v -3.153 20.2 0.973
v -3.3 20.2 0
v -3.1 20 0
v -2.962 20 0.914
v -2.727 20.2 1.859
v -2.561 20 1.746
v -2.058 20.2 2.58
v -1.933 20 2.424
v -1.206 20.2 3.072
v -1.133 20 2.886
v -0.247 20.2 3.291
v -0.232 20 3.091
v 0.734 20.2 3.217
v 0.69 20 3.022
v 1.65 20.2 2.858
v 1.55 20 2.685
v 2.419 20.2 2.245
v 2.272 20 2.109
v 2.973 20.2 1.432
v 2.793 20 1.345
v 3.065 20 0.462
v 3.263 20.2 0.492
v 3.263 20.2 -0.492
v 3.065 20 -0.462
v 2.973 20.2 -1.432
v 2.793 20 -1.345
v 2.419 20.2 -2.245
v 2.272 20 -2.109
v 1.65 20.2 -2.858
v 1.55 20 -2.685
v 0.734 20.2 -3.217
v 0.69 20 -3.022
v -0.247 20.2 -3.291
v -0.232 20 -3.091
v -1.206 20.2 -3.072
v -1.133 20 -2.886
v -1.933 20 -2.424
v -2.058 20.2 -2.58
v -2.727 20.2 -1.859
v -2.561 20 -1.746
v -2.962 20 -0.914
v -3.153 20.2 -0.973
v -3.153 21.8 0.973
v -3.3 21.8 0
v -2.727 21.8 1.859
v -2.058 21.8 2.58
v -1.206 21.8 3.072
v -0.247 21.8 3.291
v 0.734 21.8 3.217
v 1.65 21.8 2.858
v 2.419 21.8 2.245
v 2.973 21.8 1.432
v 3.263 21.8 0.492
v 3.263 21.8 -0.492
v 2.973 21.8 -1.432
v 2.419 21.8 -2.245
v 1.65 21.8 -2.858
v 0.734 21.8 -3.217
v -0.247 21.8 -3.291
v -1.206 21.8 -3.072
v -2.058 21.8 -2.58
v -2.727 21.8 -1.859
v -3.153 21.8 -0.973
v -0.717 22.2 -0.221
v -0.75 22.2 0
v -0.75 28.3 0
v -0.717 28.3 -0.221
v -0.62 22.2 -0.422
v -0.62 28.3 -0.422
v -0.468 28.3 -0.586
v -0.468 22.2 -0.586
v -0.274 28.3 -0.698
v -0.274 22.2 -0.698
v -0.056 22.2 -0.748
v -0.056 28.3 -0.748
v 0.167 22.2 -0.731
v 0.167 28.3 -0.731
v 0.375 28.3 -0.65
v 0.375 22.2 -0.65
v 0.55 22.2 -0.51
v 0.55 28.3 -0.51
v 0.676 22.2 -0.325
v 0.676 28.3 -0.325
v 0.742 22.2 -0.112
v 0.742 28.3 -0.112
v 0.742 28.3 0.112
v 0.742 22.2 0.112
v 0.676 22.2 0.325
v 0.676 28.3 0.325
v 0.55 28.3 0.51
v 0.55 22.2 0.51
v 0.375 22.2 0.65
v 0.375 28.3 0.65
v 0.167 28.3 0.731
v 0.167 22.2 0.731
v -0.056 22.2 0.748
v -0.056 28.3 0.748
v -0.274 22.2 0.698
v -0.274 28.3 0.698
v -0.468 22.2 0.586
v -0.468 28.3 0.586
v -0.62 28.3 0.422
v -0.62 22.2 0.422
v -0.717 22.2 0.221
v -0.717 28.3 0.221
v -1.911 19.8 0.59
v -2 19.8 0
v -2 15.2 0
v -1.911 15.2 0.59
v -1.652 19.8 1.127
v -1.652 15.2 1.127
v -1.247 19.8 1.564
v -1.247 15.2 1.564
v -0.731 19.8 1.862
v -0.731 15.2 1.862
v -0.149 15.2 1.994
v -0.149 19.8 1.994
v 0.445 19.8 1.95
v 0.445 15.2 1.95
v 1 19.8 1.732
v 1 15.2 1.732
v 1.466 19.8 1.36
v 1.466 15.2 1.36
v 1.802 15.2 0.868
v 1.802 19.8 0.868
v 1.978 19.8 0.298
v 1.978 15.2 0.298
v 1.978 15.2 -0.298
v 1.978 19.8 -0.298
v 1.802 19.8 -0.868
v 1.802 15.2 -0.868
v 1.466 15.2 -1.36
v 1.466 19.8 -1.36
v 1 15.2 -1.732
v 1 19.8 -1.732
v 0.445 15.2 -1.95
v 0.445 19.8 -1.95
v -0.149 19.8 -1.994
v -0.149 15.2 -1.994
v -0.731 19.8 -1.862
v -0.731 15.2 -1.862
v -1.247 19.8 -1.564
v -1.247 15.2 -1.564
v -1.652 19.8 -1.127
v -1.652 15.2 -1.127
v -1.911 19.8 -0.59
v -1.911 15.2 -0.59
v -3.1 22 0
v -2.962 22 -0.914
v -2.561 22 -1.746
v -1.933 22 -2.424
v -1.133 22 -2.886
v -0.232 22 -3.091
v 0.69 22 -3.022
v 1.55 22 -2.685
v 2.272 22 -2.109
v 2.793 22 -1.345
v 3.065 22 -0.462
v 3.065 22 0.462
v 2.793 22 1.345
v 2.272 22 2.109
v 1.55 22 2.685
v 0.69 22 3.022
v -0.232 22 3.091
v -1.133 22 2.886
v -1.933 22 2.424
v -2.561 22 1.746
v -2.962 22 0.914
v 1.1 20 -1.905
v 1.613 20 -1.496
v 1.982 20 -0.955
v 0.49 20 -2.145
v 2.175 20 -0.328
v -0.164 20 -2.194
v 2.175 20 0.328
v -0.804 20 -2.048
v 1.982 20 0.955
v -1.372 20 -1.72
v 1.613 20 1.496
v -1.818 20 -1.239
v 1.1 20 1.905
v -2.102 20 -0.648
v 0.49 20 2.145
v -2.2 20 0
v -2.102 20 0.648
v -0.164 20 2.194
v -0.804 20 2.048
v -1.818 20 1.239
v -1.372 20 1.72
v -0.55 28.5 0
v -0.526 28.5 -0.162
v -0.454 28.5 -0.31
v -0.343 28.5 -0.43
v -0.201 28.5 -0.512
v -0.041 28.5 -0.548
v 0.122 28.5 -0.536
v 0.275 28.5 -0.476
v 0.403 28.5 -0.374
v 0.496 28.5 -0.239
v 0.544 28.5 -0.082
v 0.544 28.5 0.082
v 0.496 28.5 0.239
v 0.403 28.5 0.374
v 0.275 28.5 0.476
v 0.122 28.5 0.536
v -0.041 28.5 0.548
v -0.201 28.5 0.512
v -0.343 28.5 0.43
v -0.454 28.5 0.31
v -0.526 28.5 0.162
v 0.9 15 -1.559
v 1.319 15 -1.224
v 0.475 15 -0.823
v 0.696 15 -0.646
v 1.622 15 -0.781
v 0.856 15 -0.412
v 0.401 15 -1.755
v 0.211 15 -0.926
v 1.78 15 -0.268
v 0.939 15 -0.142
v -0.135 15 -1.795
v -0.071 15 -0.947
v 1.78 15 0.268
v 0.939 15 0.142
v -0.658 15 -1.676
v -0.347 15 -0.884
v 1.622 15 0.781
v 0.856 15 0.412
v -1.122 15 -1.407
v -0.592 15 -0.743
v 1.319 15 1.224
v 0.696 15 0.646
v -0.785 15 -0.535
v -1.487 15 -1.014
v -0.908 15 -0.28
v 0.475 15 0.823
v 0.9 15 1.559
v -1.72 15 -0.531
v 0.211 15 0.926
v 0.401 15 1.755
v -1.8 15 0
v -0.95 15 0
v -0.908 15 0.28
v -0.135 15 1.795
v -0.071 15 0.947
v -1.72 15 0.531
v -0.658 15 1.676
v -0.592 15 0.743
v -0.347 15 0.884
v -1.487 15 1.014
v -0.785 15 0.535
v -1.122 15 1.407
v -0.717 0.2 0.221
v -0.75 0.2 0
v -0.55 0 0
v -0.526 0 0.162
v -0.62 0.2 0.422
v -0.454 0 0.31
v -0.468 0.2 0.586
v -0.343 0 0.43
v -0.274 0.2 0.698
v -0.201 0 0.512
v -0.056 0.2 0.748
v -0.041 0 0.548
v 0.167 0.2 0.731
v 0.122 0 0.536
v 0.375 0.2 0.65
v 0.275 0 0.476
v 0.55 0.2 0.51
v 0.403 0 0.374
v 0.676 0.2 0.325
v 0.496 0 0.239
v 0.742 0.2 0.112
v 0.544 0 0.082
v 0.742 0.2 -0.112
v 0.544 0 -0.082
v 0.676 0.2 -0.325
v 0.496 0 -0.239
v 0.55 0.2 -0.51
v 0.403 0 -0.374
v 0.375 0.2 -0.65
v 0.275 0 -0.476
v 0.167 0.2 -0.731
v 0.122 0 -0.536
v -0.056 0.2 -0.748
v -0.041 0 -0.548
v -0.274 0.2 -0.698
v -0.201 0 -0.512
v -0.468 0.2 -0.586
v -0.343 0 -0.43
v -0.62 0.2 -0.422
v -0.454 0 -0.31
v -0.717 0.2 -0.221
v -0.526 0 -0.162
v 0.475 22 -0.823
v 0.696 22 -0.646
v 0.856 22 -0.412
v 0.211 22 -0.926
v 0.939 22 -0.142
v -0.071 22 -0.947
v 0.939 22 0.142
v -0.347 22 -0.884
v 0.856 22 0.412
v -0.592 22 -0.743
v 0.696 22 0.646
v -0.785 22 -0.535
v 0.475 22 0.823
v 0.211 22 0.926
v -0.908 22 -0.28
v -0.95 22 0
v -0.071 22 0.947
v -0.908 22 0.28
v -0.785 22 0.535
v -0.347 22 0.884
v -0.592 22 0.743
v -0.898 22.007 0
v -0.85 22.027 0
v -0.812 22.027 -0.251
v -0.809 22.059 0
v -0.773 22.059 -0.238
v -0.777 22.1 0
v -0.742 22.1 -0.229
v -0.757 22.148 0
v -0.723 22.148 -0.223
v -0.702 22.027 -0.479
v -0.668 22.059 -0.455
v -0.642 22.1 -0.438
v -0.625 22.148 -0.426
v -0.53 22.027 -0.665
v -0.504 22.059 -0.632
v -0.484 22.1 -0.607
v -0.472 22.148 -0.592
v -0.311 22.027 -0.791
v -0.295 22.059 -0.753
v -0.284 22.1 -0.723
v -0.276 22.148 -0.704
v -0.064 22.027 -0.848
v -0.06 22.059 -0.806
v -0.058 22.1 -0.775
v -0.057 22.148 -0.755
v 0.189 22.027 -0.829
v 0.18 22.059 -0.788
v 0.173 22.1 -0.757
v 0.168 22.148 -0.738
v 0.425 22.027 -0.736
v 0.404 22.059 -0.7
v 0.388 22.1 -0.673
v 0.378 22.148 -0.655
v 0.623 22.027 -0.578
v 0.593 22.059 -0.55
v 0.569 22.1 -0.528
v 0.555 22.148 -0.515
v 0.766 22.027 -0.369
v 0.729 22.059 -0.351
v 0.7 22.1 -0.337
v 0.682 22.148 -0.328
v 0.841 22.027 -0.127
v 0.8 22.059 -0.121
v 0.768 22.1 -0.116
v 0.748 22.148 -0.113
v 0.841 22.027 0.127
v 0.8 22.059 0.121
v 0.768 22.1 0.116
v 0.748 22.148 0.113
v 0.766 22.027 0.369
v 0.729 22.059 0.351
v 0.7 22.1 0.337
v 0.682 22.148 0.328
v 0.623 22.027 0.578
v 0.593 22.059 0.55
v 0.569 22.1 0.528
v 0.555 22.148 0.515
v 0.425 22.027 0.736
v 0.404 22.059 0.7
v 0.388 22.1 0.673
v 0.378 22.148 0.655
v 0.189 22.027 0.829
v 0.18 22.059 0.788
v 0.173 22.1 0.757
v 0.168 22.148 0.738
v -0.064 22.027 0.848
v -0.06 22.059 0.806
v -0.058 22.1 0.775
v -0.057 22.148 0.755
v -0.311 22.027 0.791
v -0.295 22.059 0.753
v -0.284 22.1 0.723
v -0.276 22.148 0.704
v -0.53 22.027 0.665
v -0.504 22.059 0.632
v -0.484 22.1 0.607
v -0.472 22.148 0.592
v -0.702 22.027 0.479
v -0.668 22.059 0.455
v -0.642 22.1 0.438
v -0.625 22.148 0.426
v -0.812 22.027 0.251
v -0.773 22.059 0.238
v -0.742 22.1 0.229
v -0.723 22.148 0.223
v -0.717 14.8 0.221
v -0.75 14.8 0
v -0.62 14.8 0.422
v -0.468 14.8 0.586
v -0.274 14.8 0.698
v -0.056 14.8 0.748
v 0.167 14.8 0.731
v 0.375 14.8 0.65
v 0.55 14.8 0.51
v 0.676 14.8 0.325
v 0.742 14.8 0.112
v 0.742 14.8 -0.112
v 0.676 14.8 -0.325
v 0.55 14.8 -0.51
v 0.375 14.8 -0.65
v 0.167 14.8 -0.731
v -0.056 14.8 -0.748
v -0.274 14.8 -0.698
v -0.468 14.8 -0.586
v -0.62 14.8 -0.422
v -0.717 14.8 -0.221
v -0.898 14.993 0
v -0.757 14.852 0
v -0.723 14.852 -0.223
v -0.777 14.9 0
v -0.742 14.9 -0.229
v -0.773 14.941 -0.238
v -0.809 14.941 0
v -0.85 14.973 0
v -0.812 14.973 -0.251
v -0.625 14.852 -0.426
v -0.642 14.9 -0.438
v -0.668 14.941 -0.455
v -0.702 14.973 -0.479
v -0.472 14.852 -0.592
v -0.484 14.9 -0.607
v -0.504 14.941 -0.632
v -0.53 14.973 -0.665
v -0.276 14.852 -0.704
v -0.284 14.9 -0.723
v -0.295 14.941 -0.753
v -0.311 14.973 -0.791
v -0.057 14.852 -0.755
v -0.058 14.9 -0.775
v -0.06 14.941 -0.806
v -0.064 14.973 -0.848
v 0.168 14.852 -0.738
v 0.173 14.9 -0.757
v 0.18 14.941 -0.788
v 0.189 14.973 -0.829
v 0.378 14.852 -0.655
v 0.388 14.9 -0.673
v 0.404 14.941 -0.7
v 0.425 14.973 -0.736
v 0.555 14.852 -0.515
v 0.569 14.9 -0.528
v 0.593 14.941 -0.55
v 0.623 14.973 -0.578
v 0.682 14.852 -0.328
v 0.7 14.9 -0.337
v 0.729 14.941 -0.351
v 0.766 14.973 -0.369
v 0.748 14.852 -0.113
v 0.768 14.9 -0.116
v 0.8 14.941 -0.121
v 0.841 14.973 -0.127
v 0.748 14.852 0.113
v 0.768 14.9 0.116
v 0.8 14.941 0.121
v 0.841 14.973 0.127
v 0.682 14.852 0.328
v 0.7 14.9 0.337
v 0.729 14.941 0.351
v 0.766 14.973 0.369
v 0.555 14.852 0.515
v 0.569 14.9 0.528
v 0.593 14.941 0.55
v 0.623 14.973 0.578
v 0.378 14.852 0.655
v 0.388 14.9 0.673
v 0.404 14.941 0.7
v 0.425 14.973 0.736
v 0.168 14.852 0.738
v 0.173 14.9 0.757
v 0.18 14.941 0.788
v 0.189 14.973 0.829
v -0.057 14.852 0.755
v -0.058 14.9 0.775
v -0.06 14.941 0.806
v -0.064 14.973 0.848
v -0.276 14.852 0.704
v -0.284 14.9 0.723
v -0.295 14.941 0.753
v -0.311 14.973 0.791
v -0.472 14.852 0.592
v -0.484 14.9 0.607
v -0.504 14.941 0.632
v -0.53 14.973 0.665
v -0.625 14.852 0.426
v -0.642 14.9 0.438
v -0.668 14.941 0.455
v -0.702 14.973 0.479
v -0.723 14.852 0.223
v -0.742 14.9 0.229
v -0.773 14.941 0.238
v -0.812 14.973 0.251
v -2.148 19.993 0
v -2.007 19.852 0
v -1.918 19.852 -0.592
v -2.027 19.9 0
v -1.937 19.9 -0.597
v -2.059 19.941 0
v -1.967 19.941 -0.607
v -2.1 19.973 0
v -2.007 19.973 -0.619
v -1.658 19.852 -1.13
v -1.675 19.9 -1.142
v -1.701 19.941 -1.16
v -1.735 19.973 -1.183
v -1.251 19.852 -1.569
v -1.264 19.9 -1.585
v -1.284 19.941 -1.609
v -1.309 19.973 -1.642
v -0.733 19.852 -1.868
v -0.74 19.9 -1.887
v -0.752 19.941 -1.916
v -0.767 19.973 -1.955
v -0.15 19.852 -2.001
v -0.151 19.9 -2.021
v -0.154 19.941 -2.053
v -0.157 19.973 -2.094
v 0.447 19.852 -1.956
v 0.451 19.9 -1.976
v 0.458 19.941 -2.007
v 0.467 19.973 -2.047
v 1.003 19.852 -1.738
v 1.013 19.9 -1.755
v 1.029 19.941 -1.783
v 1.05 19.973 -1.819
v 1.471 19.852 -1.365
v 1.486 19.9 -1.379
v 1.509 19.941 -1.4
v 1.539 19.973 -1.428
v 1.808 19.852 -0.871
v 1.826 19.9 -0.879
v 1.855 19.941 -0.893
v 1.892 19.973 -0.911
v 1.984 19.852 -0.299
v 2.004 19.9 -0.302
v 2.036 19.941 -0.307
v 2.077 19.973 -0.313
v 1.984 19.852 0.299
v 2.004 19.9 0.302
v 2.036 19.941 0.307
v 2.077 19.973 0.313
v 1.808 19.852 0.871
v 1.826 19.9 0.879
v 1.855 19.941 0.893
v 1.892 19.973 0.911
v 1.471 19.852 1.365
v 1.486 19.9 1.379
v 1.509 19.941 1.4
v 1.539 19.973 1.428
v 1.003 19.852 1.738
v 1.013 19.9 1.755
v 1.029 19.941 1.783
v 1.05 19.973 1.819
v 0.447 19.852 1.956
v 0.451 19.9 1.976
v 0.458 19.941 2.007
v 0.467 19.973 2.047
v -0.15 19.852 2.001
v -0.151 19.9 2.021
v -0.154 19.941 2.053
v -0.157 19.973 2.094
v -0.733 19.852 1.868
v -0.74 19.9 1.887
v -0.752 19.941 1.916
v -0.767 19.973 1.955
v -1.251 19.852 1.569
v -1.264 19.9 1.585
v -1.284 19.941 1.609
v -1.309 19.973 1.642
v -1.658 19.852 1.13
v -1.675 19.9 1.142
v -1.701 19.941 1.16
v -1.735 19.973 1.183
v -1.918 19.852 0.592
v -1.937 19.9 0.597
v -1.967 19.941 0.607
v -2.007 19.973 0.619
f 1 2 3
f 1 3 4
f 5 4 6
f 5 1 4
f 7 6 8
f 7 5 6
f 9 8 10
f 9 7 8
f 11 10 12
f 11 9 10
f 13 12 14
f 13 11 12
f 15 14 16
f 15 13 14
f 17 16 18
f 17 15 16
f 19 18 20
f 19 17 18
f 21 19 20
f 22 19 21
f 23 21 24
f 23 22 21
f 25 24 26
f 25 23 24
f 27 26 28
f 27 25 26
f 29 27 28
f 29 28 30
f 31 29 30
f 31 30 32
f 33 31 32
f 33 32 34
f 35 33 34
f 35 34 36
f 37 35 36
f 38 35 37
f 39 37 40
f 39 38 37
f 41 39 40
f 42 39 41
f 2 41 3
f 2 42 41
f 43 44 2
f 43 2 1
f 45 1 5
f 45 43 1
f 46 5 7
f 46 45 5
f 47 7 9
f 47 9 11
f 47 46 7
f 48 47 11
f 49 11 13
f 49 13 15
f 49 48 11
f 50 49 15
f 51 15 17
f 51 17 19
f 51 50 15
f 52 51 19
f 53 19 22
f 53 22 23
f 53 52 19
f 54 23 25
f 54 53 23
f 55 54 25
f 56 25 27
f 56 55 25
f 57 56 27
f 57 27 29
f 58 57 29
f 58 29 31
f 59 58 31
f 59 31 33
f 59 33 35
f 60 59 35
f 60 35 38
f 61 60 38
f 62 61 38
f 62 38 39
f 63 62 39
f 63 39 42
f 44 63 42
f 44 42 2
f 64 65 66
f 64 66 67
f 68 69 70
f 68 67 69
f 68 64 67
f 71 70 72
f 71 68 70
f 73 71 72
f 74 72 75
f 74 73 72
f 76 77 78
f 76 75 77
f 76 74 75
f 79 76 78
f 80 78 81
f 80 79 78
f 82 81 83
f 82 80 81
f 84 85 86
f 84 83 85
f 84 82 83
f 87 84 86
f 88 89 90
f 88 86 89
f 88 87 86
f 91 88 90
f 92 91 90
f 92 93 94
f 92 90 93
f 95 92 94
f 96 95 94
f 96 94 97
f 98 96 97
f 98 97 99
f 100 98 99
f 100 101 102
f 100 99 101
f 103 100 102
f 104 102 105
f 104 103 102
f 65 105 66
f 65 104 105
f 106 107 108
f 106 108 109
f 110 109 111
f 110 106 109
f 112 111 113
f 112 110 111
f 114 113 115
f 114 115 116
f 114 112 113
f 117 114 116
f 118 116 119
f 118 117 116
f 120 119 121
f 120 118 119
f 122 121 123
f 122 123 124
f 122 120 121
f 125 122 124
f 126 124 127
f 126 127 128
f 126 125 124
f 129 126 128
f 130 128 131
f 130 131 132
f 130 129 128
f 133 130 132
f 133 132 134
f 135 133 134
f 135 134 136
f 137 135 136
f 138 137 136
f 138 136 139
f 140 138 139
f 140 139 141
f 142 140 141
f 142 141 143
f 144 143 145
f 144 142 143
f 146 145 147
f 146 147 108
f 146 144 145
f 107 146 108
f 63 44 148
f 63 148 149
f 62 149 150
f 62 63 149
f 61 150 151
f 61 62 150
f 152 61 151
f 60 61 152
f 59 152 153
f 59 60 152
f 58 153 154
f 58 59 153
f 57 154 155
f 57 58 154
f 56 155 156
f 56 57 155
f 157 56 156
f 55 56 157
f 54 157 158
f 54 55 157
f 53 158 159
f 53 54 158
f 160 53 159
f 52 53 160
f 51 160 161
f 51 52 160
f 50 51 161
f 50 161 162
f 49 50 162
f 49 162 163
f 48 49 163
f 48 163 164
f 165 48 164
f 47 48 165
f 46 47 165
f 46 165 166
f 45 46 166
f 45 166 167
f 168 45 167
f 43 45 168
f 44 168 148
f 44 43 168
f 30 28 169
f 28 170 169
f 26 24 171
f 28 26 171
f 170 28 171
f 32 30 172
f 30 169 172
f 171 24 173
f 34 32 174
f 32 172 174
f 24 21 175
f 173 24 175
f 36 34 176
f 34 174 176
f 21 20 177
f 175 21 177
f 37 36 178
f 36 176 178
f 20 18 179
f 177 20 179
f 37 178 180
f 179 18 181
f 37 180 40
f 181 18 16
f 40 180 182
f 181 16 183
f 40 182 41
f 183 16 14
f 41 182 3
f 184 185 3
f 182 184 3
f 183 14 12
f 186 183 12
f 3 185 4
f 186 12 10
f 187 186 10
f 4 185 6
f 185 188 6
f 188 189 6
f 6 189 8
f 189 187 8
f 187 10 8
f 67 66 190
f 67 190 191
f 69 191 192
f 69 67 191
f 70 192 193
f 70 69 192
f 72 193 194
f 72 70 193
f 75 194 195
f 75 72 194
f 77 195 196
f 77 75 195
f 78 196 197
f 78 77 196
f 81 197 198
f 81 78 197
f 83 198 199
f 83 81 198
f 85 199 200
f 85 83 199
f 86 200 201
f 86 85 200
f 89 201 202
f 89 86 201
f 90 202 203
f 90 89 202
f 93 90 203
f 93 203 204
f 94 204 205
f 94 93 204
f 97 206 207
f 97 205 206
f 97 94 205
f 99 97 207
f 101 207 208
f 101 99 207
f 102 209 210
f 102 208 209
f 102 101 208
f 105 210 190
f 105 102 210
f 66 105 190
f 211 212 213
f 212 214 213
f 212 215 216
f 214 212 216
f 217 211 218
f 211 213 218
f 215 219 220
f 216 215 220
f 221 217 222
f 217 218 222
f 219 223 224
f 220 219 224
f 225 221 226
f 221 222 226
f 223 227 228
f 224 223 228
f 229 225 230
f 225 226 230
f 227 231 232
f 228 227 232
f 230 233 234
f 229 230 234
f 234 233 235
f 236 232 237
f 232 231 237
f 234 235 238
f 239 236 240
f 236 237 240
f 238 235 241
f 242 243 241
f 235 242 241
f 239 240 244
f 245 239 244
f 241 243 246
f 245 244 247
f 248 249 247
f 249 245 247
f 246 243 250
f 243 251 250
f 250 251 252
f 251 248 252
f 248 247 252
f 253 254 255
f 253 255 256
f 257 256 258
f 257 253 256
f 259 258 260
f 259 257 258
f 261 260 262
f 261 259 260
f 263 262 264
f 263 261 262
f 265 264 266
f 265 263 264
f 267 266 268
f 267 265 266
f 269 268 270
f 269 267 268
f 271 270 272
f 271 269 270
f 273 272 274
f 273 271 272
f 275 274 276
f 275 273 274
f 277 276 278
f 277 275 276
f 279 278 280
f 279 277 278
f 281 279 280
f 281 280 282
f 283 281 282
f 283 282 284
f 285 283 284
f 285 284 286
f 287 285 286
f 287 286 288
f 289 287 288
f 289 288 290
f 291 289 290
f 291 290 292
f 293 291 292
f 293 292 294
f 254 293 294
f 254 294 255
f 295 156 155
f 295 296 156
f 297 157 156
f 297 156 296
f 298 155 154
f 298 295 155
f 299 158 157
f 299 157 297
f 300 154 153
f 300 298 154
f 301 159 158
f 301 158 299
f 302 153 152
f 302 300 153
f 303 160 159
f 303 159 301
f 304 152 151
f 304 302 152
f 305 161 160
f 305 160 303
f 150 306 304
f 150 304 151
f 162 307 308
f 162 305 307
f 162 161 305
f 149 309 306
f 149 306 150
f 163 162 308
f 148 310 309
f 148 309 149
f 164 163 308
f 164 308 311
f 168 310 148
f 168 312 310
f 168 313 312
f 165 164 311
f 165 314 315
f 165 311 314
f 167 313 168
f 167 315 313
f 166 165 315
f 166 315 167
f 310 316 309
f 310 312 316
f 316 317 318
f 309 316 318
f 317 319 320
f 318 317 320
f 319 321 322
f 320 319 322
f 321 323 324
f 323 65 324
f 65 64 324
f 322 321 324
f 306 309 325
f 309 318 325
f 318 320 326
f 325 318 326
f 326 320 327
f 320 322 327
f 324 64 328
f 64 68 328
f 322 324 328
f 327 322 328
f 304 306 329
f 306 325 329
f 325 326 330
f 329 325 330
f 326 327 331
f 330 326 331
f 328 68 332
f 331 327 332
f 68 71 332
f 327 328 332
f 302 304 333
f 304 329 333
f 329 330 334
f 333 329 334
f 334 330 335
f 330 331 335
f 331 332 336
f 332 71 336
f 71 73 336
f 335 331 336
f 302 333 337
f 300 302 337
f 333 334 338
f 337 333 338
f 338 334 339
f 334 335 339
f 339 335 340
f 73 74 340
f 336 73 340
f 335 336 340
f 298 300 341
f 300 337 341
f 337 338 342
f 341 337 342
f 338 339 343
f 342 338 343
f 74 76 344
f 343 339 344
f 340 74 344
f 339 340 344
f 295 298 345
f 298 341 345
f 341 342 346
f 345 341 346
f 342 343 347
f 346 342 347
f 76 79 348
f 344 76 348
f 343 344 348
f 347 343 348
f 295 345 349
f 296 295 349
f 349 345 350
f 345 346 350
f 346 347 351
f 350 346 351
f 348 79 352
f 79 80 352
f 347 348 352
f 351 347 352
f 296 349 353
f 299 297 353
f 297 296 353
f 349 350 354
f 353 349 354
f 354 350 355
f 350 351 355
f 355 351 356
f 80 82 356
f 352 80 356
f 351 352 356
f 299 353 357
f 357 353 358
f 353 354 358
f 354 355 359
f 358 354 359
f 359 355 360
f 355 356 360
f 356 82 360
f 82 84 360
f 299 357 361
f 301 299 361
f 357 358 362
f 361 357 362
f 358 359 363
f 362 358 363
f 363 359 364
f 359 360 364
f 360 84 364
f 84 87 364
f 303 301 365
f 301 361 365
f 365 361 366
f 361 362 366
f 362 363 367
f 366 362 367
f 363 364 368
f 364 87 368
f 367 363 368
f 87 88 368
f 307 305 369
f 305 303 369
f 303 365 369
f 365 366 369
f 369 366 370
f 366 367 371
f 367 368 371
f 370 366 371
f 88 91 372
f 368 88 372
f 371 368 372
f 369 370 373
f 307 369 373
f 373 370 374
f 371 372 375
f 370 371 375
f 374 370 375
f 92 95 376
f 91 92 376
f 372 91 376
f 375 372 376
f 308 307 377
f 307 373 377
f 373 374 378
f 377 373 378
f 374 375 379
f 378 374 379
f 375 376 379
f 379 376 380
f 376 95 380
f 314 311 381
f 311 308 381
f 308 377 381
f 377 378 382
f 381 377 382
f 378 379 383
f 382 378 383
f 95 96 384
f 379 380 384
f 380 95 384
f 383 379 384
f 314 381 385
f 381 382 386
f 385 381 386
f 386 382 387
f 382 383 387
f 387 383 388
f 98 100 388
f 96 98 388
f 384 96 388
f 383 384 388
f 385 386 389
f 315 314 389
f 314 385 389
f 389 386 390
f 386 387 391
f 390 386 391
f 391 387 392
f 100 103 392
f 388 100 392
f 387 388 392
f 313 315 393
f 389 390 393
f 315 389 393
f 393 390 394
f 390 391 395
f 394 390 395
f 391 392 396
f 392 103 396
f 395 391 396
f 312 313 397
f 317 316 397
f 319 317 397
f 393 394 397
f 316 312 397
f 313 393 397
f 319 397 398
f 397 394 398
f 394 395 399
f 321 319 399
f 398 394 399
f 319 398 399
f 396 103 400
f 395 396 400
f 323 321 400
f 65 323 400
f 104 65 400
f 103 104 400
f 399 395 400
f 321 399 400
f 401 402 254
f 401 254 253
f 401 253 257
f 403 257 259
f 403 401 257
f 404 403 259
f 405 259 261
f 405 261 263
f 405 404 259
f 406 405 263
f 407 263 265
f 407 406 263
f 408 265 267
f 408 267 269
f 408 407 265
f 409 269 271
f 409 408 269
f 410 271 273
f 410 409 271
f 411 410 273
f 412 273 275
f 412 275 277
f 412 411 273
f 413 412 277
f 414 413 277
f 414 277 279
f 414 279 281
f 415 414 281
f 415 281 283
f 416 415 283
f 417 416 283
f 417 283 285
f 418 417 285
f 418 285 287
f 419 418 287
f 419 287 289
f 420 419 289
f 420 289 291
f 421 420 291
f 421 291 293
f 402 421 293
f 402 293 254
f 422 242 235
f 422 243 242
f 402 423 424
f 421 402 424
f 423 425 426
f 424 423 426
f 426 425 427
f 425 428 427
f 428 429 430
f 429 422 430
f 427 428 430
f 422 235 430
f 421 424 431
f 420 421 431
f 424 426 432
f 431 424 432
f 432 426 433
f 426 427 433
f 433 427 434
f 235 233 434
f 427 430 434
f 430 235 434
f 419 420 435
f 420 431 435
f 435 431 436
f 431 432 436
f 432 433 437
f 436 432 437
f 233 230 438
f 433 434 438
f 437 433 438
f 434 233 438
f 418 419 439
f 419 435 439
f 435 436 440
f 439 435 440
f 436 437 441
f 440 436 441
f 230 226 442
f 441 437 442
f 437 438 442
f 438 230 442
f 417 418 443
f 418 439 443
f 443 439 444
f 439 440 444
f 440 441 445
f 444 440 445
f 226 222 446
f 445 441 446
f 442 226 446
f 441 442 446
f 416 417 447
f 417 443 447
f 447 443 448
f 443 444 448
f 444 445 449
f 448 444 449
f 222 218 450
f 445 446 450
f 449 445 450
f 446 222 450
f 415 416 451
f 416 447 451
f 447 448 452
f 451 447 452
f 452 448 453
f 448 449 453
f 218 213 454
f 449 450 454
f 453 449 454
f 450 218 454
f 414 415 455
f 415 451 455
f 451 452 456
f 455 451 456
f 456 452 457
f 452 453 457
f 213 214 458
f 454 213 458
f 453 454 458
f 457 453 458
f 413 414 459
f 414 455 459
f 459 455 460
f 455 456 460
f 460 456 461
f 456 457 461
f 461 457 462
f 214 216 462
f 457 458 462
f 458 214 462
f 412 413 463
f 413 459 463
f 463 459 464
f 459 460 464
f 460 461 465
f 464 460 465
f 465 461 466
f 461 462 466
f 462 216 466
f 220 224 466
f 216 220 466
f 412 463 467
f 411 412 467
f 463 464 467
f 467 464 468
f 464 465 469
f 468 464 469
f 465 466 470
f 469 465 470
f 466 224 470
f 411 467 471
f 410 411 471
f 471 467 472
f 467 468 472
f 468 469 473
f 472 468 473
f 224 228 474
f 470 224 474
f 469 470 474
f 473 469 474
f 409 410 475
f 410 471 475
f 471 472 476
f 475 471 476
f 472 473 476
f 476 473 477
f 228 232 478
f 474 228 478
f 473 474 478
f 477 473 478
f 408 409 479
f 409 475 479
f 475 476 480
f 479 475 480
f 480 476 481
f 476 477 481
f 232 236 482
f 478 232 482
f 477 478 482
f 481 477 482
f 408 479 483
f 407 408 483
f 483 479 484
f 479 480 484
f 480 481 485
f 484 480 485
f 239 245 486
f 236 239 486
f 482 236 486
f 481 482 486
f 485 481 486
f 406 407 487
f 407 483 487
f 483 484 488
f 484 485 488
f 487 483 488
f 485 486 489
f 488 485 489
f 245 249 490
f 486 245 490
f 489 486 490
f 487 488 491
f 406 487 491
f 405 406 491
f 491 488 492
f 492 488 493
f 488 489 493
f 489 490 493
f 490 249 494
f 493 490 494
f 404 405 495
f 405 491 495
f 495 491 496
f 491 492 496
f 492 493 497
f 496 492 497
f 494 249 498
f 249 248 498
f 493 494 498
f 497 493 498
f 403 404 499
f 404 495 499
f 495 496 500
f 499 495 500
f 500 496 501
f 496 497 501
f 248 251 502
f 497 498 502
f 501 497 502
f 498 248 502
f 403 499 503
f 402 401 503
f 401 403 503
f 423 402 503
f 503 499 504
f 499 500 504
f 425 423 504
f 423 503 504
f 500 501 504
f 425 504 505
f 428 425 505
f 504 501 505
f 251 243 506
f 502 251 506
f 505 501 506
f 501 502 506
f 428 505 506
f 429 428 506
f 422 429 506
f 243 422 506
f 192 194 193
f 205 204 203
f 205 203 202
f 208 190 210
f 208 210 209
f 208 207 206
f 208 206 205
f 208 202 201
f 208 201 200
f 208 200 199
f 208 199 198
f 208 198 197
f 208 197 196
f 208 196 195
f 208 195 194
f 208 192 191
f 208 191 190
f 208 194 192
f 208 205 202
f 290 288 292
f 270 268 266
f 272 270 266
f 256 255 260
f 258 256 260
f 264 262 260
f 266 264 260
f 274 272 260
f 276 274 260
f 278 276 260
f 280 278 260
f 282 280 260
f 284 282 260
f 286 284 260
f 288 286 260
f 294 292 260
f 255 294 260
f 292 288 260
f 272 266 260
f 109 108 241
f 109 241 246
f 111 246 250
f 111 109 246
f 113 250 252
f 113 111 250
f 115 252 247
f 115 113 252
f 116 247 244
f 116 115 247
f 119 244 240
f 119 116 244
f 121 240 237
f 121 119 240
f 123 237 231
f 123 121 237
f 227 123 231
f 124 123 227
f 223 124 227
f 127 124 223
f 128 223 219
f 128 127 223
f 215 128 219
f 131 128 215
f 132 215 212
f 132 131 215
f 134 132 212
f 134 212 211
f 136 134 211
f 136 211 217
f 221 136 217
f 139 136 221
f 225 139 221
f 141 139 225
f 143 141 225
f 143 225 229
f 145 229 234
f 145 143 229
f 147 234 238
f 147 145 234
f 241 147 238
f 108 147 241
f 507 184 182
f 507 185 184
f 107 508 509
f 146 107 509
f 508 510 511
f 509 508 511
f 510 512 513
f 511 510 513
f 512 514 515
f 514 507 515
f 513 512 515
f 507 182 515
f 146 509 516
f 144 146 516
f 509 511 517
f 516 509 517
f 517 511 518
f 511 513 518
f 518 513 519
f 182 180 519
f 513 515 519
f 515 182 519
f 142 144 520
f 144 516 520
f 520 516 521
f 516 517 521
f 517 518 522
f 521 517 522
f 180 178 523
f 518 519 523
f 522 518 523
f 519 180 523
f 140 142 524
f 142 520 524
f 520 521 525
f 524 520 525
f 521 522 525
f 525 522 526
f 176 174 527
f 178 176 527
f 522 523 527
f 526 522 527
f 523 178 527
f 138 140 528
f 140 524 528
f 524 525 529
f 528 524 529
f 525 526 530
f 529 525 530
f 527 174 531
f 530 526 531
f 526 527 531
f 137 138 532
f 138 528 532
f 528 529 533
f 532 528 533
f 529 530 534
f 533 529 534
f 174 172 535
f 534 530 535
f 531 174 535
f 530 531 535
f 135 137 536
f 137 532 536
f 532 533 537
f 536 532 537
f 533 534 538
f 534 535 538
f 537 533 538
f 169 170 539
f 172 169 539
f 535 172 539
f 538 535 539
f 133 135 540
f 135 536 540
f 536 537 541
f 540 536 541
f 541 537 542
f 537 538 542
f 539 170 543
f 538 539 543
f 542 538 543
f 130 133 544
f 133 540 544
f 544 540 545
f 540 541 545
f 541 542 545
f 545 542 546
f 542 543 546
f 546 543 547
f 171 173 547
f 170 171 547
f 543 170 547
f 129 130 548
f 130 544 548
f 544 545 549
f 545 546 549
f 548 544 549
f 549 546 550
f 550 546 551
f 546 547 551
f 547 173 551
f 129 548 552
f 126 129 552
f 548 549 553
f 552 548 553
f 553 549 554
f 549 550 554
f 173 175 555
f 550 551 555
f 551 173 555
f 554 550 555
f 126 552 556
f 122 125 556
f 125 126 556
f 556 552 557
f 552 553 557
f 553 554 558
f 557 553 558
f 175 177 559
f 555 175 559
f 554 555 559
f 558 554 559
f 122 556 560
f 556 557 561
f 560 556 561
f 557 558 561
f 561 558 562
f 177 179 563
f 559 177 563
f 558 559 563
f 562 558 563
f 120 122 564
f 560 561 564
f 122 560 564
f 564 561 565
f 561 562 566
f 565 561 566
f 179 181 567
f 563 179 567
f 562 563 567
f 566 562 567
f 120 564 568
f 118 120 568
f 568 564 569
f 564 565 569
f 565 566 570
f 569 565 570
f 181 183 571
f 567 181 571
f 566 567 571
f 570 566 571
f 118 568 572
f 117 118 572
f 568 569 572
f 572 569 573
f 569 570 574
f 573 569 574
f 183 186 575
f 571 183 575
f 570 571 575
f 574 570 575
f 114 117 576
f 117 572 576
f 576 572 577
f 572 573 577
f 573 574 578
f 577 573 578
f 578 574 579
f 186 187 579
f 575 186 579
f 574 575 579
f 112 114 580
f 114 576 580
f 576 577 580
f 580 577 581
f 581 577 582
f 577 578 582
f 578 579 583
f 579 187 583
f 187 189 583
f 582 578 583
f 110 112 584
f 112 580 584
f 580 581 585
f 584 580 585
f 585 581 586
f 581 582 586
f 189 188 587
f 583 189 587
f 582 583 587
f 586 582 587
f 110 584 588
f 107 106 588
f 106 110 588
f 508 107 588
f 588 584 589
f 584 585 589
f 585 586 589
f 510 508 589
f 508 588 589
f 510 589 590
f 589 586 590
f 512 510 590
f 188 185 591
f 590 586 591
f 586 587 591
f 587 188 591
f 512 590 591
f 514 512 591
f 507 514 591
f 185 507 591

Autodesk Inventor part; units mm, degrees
ref_plane "YZ Plane" through (0, 0, 0) normal (1, 0, 0) x (0, 1, 0)
ref_plane "XZ Plane" through (0, 0, 0) normal (0, 1, 0) x (-1, 0, 0)
ref_plane "XY Plane" through (0, 0, 0) normal (0, 0, 1) x (1, 0, 0)
sketch "Skizze1" plane through (0, 0, 0) normal (0, 0, 1) x (1, 0, 0)
  line L0 (-0.75, 28.5) -> (0, 28.5)
  line L1 (-3.3, 20) -> (-2, 20)
  line L2 (-2, 15) -> (-0.75, 15)
  line L3 (0, 28.5) -> (0, 0)
  line L4 (-0.75, 0) -> (-0.75, 15)
  line L5 (-2, 15) -> (-2, 20)
  line L6 (-3.3, 20) -> (-3.3, 22)
  line L7 (-0.75, 28.5) -> (-0.75, 22)
  line L8 (-0.75, 0) -> (0, 0)
  line L9 (-3.96, 0) -> (0.66, 0) projected
  line L10 (0, -5.7) -> (0, 34.2) projected
  line L11 (-0.75, 22) -> (-3.3, 22)
  point P0 (0, 0)
  dimension "d0" = 1.5
  dimension "d1" = 4
  dimension "d2" = 6.6
  dimension "d3" = 1.5
  dimension "d5" = 5
  dimension "d6" = 15
  dimension "d9" = 6.5
  dimension "d10" = 2
revolve "Umdrehung1" add sketch "Skizze1" angle 360 about axis through (0, -10, 0) along (0, 1, 0)
fillet "Rundung1" radius 0.2 3 edges at (0.75, 15, 0) (2, 20, 0) (0.75, 22, 0)
chamfer "Fase1" distance 0.2 angle 45 5 edges at (0.75, 0, 0) (2, 15, 0) (3.3, 20, 0) (3.3, 22, 0) (0.75, 28.5, 0)
properties part number "YTP-AP-E17-R1.0"
